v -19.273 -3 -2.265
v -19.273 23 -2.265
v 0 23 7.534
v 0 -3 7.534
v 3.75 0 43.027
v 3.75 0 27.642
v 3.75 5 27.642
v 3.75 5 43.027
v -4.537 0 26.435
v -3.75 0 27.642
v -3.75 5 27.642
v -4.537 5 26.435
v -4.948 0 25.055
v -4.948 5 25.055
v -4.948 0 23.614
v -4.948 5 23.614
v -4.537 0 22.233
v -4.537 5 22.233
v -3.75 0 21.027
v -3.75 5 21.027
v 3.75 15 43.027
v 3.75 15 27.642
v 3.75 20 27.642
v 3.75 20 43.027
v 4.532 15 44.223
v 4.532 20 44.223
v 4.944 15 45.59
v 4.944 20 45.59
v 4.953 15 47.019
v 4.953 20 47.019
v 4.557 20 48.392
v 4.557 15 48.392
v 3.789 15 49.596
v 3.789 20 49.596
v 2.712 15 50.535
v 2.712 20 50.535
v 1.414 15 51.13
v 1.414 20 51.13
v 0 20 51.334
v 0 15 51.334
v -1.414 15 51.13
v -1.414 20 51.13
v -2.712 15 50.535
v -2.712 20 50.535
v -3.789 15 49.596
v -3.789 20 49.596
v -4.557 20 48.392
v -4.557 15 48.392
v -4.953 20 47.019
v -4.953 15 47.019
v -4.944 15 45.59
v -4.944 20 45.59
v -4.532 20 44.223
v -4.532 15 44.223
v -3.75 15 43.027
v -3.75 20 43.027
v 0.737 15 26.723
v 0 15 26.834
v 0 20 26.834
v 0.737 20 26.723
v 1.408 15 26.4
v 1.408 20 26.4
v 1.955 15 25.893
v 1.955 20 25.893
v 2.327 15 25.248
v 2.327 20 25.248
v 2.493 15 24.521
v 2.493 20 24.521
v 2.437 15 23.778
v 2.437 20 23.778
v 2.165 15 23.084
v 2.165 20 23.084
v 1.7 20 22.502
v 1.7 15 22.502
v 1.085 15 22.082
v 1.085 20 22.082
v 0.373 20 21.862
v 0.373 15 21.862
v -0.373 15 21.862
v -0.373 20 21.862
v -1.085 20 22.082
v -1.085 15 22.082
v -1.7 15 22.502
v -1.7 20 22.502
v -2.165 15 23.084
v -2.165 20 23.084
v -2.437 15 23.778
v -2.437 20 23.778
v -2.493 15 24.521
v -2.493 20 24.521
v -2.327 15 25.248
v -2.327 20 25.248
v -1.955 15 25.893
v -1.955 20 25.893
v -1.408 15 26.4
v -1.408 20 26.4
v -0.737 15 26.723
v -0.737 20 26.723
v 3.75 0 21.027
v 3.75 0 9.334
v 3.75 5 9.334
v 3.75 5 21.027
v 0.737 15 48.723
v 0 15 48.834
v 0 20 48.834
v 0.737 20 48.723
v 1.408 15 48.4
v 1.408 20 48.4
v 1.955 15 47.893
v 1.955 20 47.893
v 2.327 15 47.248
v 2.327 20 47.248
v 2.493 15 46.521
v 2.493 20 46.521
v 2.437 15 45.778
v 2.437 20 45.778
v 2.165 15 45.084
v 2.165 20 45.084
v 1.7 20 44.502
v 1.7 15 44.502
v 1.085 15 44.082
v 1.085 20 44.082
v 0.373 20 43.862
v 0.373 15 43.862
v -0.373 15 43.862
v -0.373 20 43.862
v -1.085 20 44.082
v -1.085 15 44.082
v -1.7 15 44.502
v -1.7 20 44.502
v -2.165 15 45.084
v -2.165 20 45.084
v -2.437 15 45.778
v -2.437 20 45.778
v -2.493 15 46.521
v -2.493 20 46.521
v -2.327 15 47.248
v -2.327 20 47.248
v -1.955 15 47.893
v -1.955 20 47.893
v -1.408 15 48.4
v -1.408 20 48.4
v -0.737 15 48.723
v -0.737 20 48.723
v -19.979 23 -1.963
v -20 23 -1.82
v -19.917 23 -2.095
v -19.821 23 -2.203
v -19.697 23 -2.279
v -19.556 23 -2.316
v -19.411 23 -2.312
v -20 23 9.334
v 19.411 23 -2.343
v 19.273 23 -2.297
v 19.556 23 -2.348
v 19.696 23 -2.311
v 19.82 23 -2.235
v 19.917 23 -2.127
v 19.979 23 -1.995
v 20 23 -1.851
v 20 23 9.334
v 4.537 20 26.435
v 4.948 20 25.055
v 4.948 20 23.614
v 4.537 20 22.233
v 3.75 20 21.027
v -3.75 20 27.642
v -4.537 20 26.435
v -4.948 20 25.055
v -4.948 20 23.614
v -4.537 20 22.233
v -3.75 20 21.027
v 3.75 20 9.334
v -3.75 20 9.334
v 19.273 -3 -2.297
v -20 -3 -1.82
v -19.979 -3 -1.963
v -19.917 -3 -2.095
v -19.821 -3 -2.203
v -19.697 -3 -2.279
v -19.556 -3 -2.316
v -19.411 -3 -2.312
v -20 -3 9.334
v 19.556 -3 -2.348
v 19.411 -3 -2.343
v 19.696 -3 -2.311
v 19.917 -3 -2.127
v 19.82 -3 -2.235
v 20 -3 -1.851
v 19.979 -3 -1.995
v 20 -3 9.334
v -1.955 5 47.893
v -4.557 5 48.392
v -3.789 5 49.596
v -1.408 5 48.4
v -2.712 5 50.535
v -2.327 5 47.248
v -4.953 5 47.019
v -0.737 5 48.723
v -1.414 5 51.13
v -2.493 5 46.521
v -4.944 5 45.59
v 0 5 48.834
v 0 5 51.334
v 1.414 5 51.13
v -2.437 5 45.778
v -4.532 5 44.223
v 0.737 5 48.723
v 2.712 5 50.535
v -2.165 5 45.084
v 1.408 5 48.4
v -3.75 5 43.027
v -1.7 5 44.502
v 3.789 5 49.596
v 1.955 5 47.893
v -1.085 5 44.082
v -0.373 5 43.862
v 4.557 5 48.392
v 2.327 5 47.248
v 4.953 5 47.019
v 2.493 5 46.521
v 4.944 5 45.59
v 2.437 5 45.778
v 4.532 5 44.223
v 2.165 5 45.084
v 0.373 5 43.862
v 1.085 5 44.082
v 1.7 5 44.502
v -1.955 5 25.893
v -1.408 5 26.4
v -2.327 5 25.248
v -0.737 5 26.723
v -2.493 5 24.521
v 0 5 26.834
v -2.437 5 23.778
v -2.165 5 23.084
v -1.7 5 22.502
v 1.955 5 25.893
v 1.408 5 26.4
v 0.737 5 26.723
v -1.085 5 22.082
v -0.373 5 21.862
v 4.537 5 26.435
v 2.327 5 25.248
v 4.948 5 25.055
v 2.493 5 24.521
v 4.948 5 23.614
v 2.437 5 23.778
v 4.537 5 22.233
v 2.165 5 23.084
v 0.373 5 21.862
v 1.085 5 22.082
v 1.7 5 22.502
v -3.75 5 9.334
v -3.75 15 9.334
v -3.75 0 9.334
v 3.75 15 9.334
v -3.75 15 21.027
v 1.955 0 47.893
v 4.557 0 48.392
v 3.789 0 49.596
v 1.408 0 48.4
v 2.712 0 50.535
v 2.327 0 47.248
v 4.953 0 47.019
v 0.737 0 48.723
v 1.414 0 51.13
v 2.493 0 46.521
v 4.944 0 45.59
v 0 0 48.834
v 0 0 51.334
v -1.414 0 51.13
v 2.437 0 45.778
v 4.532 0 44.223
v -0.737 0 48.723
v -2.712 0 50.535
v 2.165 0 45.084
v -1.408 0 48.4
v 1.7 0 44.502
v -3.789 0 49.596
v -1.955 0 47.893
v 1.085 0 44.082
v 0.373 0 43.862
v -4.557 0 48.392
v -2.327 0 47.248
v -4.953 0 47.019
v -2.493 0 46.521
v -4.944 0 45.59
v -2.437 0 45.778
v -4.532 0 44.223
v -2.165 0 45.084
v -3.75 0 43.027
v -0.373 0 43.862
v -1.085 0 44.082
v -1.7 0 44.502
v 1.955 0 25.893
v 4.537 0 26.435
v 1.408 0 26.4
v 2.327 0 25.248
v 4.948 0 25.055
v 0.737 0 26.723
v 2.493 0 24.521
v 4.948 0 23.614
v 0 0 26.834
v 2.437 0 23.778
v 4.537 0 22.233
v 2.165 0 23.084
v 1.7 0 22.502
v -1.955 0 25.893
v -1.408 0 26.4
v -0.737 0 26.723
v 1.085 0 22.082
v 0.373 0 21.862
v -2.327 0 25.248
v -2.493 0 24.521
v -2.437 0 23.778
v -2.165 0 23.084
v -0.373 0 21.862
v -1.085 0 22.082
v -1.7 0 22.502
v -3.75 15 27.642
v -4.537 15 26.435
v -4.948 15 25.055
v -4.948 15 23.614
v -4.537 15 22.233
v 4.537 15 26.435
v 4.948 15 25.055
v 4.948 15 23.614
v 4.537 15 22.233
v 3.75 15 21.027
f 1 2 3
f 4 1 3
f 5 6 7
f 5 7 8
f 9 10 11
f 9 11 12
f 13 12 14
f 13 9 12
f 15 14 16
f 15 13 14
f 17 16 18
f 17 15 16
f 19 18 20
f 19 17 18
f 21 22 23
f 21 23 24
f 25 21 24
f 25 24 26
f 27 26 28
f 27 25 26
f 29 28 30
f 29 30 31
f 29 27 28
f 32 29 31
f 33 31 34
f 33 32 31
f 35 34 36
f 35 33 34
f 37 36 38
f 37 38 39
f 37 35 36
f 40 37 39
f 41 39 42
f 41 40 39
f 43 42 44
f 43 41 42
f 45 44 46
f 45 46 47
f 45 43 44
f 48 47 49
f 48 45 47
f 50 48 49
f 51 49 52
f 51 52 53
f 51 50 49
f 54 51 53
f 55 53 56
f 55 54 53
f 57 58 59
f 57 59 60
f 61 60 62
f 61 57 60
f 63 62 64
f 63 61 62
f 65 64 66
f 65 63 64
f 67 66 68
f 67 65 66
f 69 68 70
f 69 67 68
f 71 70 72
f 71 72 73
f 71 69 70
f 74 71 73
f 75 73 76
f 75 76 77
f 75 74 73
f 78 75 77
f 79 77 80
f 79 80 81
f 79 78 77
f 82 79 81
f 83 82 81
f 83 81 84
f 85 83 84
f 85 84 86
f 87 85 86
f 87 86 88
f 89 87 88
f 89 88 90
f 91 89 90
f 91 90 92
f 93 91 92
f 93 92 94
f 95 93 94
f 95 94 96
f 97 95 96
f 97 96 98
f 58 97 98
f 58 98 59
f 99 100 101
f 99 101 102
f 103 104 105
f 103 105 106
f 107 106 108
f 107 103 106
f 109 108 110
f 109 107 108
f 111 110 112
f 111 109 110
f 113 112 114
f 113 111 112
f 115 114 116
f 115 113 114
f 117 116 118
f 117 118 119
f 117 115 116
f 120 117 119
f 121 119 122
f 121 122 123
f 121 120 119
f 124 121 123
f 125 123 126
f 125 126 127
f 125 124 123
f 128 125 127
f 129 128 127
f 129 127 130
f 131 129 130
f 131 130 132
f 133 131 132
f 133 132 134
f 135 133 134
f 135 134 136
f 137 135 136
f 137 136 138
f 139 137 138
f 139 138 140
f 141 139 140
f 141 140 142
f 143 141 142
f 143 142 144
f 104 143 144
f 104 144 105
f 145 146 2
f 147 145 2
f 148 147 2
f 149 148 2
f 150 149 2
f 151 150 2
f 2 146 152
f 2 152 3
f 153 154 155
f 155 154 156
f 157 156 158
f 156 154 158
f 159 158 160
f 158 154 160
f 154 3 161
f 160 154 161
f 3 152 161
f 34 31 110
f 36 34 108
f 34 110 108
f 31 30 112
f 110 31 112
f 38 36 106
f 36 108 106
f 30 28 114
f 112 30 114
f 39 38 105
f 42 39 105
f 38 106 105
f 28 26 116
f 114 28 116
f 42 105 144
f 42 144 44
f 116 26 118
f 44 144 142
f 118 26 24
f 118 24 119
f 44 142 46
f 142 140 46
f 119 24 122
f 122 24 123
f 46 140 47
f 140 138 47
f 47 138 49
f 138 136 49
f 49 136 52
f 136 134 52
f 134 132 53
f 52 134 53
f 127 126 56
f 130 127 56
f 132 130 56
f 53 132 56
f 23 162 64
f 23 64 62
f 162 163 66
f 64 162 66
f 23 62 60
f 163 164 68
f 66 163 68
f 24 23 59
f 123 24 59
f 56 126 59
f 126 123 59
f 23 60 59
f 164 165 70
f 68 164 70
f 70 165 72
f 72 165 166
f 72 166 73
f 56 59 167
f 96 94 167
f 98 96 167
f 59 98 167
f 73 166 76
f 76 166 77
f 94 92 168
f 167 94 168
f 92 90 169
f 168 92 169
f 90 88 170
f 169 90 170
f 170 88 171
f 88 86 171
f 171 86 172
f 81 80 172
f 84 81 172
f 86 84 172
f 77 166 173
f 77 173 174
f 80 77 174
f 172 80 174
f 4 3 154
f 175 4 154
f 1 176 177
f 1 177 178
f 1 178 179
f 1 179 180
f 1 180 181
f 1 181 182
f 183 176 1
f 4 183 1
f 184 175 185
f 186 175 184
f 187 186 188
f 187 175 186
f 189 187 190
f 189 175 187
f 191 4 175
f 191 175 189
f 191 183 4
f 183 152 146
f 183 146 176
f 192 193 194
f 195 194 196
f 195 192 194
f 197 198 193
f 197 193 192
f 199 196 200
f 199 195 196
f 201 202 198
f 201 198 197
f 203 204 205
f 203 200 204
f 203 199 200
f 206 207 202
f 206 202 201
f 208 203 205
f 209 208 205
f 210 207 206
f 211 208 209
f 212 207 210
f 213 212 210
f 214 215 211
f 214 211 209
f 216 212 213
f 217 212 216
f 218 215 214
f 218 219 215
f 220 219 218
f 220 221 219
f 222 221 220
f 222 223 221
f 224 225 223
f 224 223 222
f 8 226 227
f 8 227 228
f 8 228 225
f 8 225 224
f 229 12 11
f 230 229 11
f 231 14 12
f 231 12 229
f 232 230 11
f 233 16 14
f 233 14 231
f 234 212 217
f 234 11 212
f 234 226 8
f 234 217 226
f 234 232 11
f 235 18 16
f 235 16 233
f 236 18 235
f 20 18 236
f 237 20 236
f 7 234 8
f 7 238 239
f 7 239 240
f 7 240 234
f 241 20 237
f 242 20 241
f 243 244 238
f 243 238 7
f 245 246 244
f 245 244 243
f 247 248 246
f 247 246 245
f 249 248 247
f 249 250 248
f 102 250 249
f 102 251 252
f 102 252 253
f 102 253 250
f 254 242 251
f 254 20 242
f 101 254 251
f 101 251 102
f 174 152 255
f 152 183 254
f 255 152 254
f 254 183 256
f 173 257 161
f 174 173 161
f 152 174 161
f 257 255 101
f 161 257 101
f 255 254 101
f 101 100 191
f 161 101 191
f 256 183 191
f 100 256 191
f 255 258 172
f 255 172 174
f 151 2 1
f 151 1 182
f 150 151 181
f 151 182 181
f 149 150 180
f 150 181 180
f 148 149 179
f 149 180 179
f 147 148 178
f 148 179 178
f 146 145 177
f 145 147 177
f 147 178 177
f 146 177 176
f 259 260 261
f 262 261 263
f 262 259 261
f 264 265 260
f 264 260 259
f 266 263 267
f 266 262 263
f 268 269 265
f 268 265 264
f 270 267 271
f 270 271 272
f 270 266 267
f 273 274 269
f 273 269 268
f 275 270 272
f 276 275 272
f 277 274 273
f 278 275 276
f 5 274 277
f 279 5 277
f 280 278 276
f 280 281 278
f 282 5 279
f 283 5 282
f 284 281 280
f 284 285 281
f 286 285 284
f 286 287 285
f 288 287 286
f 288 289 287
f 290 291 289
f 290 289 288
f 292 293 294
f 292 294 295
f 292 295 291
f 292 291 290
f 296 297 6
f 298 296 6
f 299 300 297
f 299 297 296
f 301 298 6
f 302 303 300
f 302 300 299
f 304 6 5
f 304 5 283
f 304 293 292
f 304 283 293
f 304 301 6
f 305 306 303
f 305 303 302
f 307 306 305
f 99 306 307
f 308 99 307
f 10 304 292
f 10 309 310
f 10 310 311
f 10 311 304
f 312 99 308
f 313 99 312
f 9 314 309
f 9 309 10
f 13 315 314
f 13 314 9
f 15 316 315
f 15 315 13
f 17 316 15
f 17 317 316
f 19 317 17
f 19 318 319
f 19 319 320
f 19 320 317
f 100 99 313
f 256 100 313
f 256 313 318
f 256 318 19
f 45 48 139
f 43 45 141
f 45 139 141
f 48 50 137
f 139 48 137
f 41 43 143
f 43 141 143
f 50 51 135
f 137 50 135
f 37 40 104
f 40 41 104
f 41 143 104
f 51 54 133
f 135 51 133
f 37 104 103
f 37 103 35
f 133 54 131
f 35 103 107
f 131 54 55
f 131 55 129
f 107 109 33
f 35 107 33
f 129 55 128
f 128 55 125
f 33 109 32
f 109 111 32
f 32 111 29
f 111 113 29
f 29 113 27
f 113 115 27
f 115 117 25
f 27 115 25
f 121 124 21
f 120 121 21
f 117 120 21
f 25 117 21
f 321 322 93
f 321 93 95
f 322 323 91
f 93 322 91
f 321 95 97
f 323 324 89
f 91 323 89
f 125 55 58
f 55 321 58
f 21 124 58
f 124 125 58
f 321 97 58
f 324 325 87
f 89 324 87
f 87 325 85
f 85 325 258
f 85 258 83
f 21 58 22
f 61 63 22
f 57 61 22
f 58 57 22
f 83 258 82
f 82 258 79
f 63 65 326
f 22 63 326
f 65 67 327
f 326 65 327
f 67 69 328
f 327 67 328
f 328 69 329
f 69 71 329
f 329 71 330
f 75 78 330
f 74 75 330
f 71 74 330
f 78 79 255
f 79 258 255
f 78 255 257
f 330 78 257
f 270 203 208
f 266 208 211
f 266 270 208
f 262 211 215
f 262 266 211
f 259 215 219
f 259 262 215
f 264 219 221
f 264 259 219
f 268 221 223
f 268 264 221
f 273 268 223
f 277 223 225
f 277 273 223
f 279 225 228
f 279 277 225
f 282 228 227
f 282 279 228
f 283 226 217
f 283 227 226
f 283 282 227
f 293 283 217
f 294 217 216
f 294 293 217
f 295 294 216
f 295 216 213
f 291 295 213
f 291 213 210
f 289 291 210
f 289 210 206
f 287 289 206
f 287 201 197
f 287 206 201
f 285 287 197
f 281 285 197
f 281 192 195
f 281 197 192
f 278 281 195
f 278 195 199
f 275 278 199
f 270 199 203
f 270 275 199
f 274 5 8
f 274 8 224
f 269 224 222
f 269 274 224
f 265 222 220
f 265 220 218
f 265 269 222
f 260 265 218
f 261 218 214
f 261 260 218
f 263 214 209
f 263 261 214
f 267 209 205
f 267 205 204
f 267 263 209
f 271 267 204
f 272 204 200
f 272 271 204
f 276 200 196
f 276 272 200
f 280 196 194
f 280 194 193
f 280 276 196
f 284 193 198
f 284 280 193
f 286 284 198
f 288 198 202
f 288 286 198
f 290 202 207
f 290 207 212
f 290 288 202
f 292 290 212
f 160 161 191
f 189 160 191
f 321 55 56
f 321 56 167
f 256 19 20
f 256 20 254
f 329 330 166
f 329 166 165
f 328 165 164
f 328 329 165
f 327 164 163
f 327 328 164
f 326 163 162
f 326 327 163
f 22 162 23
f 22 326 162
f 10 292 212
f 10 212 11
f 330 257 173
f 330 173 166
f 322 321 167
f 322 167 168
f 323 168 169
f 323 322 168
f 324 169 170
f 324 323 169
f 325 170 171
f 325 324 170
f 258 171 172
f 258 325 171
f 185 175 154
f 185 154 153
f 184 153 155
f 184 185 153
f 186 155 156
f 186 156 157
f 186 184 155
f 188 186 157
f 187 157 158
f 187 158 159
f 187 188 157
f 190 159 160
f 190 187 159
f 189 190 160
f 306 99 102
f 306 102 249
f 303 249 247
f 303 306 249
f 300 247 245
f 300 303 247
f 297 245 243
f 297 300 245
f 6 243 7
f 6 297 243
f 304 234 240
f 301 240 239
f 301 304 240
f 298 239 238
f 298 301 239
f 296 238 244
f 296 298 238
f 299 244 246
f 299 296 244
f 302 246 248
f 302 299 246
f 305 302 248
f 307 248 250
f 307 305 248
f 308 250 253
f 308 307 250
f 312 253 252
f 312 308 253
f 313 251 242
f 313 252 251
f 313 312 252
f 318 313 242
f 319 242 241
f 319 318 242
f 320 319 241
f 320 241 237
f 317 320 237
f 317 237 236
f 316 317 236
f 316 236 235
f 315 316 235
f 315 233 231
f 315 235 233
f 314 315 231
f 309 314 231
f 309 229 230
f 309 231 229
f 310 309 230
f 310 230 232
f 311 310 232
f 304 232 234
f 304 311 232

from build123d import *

# Parameters (mm, degrees)
SKETCH1_R               = 2.5
BOSS_EXTRUDE1_DEPTH     = 20
CUT_EXTRUDE1_DEPTH      = 5
CUT_EXTRUDE1_DEPTH_BACK = 5
SKETCH2_W               = 23.75
SKETCH2_H               = 48.430343558
SKETCH3_W               = 40
SKETCH3_H               = 3
BOSS_EXTRUDE2_DEPTH     = 18.668764839
CUT_EXTRUDE2_DEPTH      = 61.919773624
SKETCH5_W               = 6.668765996
SKETCH5_H               = 26
CUT_EXTRUDE3_DEPTH      = 20
FILLET1_R               = 0.5
FILLET3_START           = -4
FILLET3_DEPTH           = 28


with BuildPart() as part:
    # Sketch1 → Boss-Extrude1 (new body)
    with BuildSketch(Plane(origin=(0, 0, 0), x_dir=(1, 0, 0), z_dir=(0, 1, 0))):
        with BuildLine():
            Line((-20, 9.33438242), (20, 9.33438242))
            Line((20, 9.33438242), (20, -9.33438242))
            Line((20, -9.33438242), (3.75, -9.33438242))
            Line((3.75, -9.33438242), (3.75, -21.027193281))
            ThreePointArc((3.75, -21.027193281), (5, -24.33438242), (3.75, -27.641571559))
            Line((3.75, -27.641571559), (3.75, -43.027193281))
            ThreePointArc((3.75, -43.027193281), (0, -51.33438242), (-3.75, -43.027193281))
            Line((-3.75, -43.027193281), (-3.75, -27.641571559))
            ThreePointArc((-3.75, -27.641571559), (-5, -24.33438242), (-3.75, -21.027193281))
            Line((-3.75, -21.027193281), (-3.75, -9.33438242))
            Line((-3.75, -9.33438242), (-20, -9.33438242))
            Line((-20, -9.33438242), (-20, 9.33438242))
        make_face()
        with Locations(Location((0, -24.33438242, 0), (0, 0, 270))):
            Circle(SKETCH1_R, mode=Mode.SUBTRACT)
        with Locations(Location((0, -46.33438242, 0), (0, 0, 270))):
            Circle(SKETCH1_R, mode=Mode.SUBTRACT)
    extrude(amount=BOSS_EXTRUDE1_DEPTH)

    # Sketch2 → Cut-Extrude1 (cut, two sides: drawn at the far end of the back side and taken through both)
    with BuildSketch(Plane(origin=(0, 10, 0), x_dir=(1, 0, 0), z_dir=(0, 1, 0)).offset(-CUT_EXTRUDE1_DEPTH_BACK)):
        with Locations((0, -33.549554199)):
            Rectangle(SKETCH2_W, SKETCH2_H)
    extrude(amount=CUT_EXTRUDE1_DEPTH + CUT_EXTRUDE1_DEPTH_BACK, mode=Mode.SUBTRACT)

    # Sketch3 → Boss-Extrude2 (add)
    with BuildSketch(Plane.XY.offset(9.33438242)):
        with Locations((0, 21.5)):
            Rectangle(SKETCH3_W, SKETCH3_H)
    boss_extrude2 = extrude(amount=-BOSS_EXTRUDE2_DEPTH)

    # Mirror1: Boss-Extrude2 across plane
    add(boss_extrude2.mirror(Plane.ZX.offset(10)))

    # Sketch4 → Cut-Extrude2 (cut, through all)
    with BuildSketch(Plane(origin=(0, 23, 0), x_dir=(1, 0, 0), z_dir=(0, 1, 0))):
        Polygon((-20.060606499, 2.66561758), (0, -7.53438242), (19.99607118, 2.66561758), (20, 9.33438242), (-20, 9.33438242), align=None)
    extrude(amount=-CUT_EXTRUDE2_DEPTH, mode=Mode.SUBTRACT)

    # Sketch5 → Cut-Extrude3 (cut)
    with BuildSketch(Plane(origin=(19.994493824, 0, 0.011779509), x_dir=(-0.0005891375272774049, 0, 0.999999826458472), z_dir=(-0.9999998264584721, 0, -0.0005891375272774049))):
        with Locations((-6.011780552, 10)):
            Rectangle(SKETCH5_W, SKETCH5_H)
    extrude(amount=-CUT_EXTRUDE3_DEPTH, mode=Mode.SUBTRACT)

    # Fillet1
    # the kernel refuses this fillet: 0.5 mm, written as the material it takes off along each edge
    with BuildSketch(Plane(origin=(-20, -5.037877222, -2.634801648), x_dir=(0, 0, 1), z_dir=(0, 1, 0))) as fillet1_piece_1:
        with BuildLine():
            CenterArc((FILLET1_R * 1.6303017777, FILLET1_R), FILLET1_R, 153.048520929, 116.951479071)
            Line((FILLET1_R * 0.738911111215, FILLET1_R * 1.4532357882), (0, 0))
            Line((0, 0), (FILLET1_R * 1.6303017777, 0))
        make_face()
    extrude(amount=30.075754444, mode=Mode.SUBTRACT)
    with BuildSketch(Plane(origin=(20, 23.156386842, -2.665615266), x_dir=(0, 0, 1), z_dir=(0, -1, 0))) as fillet1_piece_2:
        with BuildLine():
            CenterArc((0.062554737, 0.5), FILLET1_R, 262.81265488, 7.18734512)
            Line((-2.315e-06, 0.00392882), (0, 0))
            Line((0, 0), (0.062554737, 0))
        make_face()
    extrude(amount=26.312773684, mode=Mode.SUBTRACT)

    # Fillet3: read off the stored shape, not the designer's step
    # Fillet3 outline → Fillet3 (cut)
    with BuildSketch(Plane(origin=(0, 0, 0), x_dir=(1, 0, 0), z_dir=(0, 1, 0)).offset(FILLET3_START)):
        with BuildLine():
            ThreePointArc((19.272801541, 2.296677589), (19.761152035, 2.277657587), (20, 1.851277926))
            Line((20, 1.851277926), (20, 2.603060529))
            ThreePointArc((20, 2.603060529), (19.999016828, 2.63440068), (19.99607118, 2.66561758))
            Line((19.99607118, 2.66561758), (19.272801541, 2.296677589))
        make_face()
    extrude(amount=FILLET3_DEPTH, mode=Mode.SUBTRACT)


solid = part.part
